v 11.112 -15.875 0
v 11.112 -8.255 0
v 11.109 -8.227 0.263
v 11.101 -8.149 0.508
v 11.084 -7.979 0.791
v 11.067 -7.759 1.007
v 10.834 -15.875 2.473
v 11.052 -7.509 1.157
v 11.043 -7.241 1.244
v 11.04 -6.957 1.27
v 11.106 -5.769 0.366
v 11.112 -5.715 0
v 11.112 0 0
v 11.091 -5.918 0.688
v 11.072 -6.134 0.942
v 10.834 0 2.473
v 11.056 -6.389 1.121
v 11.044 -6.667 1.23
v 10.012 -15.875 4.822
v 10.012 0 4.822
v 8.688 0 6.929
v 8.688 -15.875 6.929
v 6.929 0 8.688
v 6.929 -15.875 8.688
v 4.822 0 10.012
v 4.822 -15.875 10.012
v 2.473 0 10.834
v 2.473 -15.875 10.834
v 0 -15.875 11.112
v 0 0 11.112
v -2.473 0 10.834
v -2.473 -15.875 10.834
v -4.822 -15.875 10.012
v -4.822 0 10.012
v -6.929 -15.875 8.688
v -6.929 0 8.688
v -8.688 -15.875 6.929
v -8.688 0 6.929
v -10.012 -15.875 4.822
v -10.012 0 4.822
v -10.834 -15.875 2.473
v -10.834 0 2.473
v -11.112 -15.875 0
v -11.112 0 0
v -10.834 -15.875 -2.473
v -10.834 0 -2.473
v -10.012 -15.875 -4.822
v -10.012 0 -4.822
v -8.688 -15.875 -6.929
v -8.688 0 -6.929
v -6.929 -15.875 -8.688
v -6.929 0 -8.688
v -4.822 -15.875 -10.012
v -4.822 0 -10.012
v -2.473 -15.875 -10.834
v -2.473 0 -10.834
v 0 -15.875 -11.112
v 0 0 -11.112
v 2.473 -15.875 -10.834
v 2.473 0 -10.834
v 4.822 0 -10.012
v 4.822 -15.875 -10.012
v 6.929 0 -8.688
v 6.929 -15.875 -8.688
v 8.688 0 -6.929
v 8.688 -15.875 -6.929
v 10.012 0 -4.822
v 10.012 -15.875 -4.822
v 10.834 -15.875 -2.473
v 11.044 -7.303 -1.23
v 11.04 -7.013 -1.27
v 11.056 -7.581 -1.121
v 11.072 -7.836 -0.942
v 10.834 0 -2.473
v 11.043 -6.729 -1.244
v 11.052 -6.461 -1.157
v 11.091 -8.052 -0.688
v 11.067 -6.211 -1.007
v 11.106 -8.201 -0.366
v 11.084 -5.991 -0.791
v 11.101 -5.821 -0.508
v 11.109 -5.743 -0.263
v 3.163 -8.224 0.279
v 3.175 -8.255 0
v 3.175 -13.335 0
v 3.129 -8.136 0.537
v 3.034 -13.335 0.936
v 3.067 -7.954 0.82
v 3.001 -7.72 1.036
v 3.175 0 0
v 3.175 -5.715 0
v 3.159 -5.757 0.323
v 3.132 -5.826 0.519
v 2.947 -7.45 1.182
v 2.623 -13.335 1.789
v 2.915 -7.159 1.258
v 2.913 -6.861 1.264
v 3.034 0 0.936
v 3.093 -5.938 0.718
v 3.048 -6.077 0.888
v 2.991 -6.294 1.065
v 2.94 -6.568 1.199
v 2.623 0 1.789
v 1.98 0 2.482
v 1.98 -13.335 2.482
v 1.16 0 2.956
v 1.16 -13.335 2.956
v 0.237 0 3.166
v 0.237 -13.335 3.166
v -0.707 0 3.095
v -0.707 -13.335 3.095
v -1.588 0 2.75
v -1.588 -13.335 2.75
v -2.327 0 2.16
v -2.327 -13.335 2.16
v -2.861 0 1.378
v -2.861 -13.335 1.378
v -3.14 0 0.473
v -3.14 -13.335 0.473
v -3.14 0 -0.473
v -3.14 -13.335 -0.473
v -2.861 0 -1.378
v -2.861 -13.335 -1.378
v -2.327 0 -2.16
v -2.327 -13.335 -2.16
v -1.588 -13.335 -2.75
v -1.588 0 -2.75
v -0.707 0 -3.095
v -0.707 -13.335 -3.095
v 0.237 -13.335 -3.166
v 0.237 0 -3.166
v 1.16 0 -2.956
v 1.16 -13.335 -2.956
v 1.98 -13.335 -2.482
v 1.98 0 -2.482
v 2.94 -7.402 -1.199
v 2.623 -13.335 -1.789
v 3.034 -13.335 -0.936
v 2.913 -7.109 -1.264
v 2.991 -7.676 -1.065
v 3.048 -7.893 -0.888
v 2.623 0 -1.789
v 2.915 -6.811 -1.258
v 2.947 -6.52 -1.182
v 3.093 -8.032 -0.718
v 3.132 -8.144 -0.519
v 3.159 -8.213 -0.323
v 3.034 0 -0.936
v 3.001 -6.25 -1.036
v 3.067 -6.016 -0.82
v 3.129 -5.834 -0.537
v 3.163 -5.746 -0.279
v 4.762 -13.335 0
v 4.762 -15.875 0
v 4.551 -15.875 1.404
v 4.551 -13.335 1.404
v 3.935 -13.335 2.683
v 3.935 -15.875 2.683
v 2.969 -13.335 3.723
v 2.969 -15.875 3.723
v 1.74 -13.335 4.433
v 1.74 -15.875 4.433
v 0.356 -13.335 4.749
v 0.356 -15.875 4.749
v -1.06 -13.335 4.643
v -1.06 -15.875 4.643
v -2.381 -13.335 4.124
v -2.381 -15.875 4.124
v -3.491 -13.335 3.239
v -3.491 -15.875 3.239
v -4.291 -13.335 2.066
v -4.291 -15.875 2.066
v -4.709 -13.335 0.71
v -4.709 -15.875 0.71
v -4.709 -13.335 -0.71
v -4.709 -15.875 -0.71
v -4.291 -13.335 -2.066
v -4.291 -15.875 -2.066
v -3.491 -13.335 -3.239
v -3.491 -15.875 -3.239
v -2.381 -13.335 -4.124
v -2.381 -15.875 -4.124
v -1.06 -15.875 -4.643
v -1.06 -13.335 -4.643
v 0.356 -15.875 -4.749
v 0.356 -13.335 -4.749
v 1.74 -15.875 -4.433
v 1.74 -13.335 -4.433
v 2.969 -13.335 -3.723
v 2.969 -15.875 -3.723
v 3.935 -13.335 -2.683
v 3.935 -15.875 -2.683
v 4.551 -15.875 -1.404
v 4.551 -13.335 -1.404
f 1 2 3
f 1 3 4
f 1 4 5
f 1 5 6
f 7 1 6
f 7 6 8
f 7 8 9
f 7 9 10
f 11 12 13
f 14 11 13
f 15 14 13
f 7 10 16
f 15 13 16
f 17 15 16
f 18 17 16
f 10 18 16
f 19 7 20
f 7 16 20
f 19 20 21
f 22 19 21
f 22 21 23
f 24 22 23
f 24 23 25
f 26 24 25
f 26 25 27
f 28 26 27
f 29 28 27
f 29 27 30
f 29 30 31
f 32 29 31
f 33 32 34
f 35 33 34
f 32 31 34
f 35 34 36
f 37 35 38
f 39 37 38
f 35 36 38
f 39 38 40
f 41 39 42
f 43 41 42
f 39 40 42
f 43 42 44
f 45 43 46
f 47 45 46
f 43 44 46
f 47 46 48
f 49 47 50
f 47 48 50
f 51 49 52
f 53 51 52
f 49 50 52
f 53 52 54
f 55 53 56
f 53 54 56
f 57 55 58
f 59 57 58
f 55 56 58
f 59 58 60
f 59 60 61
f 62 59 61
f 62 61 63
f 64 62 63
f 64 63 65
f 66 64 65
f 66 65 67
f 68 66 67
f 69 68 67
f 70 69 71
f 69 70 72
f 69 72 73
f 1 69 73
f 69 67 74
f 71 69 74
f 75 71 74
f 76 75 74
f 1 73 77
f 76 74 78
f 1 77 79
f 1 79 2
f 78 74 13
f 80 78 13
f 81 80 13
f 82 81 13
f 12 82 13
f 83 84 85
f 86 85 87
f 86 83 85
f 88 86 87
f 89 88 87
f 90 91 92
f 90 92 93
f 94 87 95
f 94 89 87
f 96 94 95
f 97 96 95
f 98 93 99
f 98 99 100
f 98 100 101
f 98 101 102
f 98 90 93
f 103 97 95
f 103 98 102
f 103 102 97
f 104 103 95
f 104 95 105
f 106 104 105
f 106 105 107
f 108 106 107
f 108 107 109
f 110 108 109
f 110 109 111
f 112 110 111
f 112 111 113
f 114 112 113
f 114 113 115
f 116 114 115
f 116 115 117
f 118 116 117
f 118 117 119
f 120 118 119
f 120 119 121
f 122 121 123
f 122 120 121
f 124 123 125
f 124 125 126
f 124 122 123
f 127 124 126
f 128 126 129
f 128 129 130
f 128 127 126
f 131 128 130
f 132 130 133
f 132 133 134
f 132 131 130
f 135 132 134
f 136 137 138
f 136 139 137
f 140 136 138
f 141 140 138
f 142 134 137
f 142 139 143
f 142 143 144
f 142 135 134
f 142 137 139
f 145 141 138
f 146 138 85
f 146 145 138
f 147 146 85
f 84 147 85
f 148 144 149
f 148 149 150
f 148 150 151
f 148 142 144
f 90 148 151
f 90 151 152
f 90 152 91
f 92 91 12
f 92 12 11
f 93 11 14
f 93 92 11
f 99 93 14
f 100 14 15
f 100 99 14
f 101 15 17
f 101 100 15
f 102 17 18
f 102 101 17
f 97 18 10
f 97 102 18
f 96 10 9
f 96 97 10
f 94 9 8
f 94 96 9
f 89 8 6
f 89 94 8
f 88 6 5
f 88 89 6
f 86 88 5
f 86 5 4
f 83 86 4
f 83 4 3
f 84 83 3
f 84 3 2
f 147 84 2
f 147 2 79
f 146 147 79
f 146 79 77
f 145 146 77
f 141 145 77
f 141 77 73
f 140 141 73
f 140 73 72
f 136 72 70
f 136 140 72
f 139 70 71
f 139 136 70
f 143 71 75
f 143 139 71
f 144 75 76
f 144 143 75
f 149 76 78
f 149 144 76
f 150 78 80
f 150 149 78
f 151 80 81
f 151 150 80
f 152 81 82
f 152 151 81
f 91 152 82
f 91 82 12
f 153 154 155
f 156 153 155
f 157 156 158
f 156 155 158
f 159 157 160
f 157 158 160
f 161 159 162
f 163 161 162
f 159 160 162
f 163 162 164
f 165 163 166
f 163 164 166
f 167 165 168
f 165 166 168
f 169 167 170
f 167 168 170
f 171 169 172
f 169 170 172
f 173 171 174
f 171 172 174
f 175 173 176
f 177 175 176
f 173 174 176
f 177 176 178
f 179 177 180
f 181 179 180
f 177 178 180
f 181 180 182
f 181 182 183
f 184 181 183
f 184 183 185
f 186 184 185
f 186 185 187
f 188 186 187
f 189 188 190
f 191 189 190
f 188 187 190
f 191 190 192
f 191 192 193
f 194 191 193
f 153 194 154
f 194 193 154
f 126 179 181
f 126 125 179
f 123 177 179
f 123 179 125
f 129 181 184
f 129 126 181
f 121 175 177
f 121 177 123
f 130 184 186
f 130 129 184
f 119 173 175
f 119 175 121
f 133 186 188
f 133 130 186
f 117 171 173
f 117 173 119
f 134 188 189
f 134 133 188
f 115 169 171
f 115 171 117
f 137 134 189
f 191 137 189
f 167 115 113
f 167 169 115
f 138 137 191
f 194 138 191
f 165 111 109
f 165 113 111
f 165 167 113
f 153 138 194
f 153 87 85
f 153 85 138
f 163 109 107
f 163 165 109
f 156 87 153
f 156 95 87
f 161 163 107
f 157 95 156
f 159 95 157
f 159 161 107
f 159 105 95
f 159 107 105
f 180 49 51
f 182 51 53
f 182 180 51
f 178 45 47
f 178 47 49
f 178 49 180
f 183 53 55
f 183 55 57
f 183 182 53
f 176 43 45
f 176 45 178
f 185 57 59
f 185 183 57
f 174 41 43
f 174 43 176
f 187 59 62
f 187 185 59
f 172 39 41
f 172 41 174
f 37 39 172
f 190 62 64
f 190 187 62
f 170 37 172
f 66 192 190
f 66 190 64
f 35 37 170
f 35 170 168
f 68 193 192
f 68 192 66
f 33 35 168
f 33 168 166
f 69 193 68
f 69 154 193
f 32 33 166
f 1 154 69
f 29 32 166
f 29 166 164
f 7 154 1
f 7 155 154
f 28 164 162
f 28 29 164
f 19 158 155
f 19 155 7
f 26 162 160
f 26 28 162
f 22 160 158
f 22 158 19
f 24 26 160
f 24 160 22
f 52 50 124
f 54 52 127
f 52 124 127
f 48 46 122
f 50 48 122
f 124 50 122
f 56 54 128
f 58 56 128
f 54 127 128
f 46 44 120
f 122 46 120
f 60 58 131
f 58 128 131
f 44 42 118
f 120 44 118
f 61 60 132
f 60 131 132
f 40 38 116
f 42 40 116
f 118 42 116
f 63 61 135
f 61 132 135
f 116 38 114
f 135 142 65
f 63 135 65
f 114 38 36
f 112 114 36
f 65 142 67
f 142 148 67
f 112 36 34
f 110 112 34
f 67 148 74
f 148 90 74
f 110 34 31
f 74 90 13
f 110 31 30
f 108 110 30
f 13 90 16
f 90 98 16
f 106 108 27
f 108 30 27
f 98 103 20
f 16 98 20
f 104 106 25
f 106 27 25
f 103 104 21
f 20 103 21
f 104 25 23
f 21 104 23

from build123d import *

# Parameters (mm, degrees)
F0_R     = 11.1125
F0_R_2   = 3.175
F1_DEPTH = 15.875
F2_R     = 4.7625
F2_R_2   = 3.175
F3_DEPTH = 2.54
F4_R     = 1.27
F5_DEPTH = 11.1135


with BuildPart() as f1:
    # F0 (on Front) → F1 (new body)
    with BuildSketch(Plane.XZ):
        Circle(F0_R)
        Circle(F0_R_2, mode=Mode.SUBTRACT)
    extrude(amount=F1_DEPTH)

    # F2 (on face) → F3 (cut)
    with BuildSketch(Plane.XZ.offset(15.875)):
        Circle(F2_R)
        Circle(F2_R_2, mode=Mode.SUBTRACT)
    extrude(amount=-F3_DEPTH, mode=Mode.SUBTRACT)

    # F4 (on Right) → F5 (cut, through all)
    with BuildSketch(Plane.YZ):
        with Locations((-6.985, 0)):
            Circle(F4_R)
    extrude(amount=F5_DEPTH, mode=Mode.SUBTRACT)


solid = f1.part
